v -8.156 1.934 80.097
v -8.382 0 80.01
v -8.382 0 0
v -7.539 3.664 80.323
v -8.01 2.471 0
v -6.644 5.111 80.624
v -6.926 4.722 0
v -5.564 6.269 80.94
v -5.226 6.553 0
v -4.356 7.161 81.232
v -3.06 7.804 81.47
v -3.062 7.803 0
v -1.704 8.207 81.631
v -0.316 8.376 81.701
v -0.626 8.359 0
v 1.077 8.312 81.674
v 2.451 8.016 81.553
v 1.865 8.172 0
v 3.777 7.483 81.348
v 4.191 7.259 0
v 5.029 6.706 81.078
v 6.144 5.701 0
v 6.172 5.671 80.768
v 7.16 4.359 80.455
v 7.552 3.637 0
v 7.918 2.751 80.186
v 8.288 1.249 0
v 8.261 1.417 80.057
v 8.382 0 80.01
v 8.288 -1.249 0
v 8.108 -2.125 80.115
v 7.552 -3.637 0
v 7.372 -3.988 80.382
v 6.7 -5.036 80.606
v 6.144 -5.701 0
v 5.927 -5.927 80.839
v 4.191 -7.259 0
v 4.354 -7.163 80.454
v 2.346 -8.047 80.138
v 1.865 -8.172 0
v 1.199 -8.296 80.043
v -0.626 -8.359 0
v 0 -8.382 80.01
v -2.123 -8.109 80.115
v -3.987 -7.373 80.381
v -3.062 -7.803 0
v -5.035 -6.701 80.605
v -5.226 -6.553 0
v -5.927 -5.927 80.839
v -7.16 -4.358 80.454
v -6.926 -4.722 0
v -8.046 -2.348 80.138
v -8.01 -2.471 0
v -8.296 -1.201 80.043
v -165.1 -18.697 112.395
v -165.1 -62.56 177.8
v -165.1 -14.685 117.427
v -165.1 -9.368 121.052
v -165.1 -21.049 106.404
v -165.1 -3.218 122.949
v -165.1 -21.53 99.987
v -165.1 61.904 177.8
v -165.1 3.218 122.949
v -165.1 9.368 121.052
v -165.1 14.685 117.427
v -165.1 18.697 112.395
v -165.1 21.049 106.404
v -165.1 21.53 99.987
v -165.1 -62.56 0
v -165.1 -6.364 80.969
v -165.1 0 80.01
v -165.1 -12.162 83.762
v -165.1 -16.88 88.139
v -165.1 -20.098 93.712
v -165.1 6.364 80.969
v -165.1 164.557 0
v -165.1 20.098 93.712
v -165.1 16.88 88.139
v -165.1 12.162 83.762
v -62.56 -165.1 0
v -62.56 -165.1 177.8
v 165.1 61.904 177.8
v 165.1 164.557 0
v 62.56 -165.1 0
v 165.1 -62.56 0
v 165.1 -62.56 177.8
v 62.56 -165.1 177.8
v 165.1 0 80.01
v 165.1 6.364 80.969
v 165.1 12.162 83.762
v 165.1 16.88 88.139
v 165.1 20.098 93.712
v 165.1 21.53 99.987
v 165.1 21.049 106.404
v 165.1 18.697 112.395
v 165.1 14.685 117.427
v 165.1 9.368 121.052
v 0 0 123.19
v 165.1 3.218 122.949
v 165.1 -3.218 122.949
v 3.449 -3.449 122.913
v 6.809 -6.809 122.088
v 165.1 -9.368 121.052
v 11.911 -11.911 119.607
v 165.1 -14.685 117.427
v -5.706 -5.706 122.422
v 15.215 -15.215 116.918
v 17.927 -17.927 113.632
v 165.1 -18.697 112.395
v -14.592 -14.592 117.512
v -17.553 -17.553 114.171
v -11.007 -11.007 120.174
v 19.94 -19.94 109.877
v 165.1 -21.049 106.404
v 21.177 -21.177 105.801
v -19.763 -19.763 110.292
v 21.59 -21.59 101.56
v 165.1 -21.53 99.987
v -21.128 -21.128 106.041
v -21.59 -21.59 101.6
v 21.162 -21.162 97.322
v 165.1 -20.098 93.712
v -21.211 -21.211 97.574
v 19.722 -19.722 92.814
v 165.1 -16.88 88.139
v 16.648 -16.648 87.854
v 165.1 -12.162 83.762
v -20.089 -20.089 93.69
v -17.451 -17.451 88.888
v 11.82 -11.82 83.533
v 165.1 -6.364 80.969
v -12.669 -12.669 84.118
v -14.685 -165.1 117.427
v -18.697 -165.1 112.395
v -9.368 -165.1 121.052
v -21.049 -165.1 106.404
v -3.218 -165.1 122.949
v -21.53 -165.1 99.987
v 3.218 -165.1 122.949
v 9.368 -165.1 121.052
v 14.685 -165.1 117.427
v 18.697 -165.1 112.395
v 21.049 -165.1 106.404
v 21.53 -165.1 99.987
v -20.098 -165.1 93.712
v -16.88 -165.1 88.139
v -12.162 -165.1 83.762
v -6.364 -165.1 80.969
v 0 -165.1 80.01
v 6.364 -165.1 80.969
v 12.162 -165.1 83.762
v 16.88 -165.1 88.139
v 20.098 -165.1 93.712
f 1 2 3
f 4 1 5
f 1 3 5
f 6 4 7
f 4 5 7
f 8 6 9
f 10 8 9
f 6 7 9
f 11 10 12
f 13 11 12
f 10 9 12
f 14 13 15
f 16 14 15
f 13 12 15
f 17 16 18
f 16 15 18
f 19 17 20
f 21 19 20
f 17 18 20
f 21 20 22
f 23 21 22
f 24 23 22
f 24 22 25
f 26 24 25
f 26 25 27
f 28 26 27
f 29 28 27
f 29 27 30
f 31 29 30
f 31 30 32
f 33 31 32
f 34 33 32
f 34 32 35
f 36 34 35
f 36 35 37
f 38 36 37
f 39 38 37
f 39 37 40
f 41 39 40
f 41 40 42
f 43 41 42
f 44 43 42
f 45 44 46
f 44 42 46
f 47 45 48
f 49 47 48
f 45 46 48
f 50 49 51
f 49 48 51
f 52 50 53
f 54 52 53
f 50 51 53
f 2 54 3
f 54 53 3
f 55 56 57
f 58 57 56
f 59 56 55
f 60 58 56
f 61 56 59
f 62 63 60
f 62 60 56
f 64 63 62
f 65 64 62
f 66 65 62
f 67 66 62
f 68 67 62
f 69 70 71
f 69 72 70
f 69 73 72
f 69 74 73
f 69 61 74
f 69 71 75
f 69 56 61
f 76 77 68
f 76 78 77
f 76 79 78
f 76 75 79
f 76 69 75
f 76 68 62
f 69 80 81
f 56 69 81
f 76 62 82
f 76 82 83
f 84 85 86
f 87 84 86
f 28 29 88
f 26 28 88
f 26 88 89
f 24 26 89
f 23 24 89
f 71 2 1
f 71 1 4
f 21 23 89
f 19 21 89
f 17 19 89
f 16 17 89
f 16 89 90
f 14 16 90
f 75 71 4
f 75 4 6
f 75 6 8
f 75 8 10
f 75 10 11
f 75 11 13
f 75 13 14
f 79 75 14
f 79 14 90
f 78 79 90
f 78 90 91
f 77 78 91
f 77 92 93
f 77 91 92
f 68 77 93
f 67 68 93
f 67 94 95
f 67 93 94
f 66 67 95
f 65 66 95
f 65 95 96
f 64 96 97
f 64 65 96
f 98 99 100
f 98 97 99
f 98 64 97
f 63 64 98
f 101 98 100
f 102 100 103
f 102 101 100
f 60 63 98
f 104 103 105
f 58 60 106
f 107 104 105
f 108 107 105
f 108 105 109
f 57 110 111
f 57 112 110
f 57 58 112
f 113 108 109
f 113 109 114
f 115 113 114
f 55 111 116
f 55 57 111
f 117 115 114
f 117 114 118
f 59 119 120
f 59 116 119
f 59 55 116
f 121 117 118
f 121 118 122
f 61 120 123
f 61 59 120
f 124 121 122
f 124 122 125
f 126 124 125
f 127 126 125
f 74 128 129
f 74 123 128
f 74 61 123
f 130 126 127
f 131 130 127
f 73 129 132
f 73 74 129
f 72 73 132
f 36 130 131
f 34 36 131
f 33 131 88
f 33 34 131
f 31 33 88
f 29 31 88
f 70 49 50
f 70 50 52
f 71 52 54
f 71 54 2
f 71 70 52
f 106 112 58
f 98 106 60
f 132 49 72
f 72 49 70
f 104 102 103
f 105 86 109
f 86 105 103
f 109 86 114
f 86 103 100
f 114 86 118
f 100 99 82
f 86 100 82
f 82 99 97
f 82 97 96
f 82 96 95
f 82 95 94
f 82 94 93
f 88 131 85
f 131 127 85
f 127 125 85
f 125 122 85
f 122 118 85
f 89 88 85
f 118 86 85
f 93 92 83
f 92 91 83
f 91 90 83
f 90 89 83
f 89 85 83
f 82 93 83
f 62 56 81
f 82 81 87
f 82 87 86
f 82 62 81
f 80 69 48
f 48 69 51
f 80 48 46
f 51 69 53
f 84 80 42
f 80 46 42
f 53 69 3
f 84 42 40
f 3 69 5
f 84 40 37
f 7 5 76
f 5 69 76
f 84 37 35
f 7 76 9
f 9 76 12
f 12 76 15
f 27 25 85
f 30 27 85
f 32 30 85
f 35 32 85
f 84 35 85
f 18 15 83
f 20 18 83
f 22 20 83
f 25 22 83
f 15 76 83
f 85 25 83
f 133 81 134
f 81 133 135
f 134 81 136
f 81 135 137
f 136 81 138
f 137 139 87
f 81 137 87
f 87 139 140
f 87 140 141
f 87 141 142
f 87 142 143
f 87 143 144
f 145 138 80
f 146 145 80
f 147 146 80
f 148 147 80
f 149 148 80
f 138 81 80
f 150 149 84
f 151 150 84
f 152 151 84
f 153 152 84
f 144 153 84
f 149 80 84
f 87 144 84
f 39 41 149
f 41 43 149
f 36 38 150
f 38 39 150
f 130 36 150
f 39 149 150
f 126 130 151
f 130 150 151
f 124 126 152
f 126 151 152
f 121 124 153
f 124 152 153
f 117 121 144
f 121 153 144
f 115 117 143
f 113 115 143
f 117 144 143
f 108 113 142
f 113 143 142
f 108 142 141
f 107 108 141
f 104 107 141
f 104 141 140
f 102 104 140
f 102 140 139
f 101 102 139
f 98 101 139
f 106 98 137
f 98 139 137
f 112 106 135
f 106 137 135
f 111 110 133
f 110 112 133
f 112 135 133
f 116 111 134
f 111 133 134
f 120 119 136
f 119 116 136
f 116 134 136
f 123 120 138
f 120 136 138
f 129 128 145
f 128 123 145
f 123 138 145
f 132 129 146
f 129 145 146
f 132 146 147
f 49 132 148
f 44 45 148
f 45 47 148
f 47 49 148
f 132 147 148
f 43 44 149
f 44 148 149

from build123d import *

# Parameters (mm, degrees)
SKETCH2_W               = 330.2
SKETCH2_H               = 330.2
BOSS_EXTRUDE1_DEPTH     = 177.8
CUT_EXTRUDE1_DEPTH      = 410.759551445
CUT_EXTRUDE1_DEPTH_BACK = 410.759551445
SKETCH3_R               = 21.59
SKETCH5_R               = 8.382
CUT_EXTRUDE3_DEPTH      = 101.6
SKETCH6_R               = 21.59
CUT_EXTRUDE4_DEPTH      = 165.1
CHAMFER6_SIZE           = 103.195588962
CHAMFER6_SIZE_2         = 178.7400032
CHAMFER7_SIZE           = 102.5400032


with BuildPart() as part:
    # Sketch2 → Boss-Extrude1 (new body)
    with BuildSketch(Plane.XY):
        Rectangle(SKETCH2_W, SKETCH2_H)
    extrude(amount=BOSS_EXTRUDE1_DEPTH)

    # Sketch3 → Cut-Extrude1 (cut, two sides: drawn at the far end of the back side and taken through both)
    with BuildSketch(Plane(origin=(165.1, 0, 0), x_dir=(0, 0, -1), z_dir=(1, 0, 0)).offset(-CUT_EXTRUDE1_DEPTH_BACK)):
        with Locations((-101.6, 0)):
            Circle(SKETCH3_R)
    extrude(amount=CUT_EXTRUDE1_DEPTH + CUT_EXTRUDE1_DEPTH_BACK, mode=Mode.SUBTRACT)

    # Sketch5 → Cut-Extrude3 (cut)
    with BuildSketch(Plane(origin=(0, 0, 0), x_dir=(-1, 0, 0), z_dir=(0, 0, -1))):
        Circle(SKETCH5_R)
    extrude(amount=-CUT_EXTRUDE3_DEPTH, mode=Mode.SUBTRACT)

    # Sketch6 → Cut-Extrude4 (cut)
    with BuildSketch(Plane.XZ.offset(165.1)):
        with Locations(Location((0, 101.6, 0), (0, 0, 270))):
            Circle(SKETCH6_R)
    extrude(amount=-CUT_EXTRUDE4_DEPTH, mode=Mode.SUBTRACT)

    # Chamfer6
    # the kernel refuses this chamfer: 178.7400032, 103.195588962 mm, written as the material it takes off along each edge
    with BuildSketch(Plane(origin=(627.515716064, 165.1, 177.8), x_dir=(0, -1, 0), z_dir=(-1, 0, 0))) as chamfer6_piece_1:
        Polygon((CHAMFER6_SIZE, 0), (0, -CHAMFER6_SIZE_2), (0, 0), align=None)
    extrude(amount=1255.031432128, mode=Mode.SUBTRACT)

    # Chamfer7
    chamfer7_edges = [part.edges().sort_by_distance(p)[0] for p in [
        (165.1, -165.1, 88.9),
        (-165.1, -165.1, 88.9),
    ]]
    chamfer(chamfer7_edges, length=CHAMFER7_SIZE)


solid = part.part
